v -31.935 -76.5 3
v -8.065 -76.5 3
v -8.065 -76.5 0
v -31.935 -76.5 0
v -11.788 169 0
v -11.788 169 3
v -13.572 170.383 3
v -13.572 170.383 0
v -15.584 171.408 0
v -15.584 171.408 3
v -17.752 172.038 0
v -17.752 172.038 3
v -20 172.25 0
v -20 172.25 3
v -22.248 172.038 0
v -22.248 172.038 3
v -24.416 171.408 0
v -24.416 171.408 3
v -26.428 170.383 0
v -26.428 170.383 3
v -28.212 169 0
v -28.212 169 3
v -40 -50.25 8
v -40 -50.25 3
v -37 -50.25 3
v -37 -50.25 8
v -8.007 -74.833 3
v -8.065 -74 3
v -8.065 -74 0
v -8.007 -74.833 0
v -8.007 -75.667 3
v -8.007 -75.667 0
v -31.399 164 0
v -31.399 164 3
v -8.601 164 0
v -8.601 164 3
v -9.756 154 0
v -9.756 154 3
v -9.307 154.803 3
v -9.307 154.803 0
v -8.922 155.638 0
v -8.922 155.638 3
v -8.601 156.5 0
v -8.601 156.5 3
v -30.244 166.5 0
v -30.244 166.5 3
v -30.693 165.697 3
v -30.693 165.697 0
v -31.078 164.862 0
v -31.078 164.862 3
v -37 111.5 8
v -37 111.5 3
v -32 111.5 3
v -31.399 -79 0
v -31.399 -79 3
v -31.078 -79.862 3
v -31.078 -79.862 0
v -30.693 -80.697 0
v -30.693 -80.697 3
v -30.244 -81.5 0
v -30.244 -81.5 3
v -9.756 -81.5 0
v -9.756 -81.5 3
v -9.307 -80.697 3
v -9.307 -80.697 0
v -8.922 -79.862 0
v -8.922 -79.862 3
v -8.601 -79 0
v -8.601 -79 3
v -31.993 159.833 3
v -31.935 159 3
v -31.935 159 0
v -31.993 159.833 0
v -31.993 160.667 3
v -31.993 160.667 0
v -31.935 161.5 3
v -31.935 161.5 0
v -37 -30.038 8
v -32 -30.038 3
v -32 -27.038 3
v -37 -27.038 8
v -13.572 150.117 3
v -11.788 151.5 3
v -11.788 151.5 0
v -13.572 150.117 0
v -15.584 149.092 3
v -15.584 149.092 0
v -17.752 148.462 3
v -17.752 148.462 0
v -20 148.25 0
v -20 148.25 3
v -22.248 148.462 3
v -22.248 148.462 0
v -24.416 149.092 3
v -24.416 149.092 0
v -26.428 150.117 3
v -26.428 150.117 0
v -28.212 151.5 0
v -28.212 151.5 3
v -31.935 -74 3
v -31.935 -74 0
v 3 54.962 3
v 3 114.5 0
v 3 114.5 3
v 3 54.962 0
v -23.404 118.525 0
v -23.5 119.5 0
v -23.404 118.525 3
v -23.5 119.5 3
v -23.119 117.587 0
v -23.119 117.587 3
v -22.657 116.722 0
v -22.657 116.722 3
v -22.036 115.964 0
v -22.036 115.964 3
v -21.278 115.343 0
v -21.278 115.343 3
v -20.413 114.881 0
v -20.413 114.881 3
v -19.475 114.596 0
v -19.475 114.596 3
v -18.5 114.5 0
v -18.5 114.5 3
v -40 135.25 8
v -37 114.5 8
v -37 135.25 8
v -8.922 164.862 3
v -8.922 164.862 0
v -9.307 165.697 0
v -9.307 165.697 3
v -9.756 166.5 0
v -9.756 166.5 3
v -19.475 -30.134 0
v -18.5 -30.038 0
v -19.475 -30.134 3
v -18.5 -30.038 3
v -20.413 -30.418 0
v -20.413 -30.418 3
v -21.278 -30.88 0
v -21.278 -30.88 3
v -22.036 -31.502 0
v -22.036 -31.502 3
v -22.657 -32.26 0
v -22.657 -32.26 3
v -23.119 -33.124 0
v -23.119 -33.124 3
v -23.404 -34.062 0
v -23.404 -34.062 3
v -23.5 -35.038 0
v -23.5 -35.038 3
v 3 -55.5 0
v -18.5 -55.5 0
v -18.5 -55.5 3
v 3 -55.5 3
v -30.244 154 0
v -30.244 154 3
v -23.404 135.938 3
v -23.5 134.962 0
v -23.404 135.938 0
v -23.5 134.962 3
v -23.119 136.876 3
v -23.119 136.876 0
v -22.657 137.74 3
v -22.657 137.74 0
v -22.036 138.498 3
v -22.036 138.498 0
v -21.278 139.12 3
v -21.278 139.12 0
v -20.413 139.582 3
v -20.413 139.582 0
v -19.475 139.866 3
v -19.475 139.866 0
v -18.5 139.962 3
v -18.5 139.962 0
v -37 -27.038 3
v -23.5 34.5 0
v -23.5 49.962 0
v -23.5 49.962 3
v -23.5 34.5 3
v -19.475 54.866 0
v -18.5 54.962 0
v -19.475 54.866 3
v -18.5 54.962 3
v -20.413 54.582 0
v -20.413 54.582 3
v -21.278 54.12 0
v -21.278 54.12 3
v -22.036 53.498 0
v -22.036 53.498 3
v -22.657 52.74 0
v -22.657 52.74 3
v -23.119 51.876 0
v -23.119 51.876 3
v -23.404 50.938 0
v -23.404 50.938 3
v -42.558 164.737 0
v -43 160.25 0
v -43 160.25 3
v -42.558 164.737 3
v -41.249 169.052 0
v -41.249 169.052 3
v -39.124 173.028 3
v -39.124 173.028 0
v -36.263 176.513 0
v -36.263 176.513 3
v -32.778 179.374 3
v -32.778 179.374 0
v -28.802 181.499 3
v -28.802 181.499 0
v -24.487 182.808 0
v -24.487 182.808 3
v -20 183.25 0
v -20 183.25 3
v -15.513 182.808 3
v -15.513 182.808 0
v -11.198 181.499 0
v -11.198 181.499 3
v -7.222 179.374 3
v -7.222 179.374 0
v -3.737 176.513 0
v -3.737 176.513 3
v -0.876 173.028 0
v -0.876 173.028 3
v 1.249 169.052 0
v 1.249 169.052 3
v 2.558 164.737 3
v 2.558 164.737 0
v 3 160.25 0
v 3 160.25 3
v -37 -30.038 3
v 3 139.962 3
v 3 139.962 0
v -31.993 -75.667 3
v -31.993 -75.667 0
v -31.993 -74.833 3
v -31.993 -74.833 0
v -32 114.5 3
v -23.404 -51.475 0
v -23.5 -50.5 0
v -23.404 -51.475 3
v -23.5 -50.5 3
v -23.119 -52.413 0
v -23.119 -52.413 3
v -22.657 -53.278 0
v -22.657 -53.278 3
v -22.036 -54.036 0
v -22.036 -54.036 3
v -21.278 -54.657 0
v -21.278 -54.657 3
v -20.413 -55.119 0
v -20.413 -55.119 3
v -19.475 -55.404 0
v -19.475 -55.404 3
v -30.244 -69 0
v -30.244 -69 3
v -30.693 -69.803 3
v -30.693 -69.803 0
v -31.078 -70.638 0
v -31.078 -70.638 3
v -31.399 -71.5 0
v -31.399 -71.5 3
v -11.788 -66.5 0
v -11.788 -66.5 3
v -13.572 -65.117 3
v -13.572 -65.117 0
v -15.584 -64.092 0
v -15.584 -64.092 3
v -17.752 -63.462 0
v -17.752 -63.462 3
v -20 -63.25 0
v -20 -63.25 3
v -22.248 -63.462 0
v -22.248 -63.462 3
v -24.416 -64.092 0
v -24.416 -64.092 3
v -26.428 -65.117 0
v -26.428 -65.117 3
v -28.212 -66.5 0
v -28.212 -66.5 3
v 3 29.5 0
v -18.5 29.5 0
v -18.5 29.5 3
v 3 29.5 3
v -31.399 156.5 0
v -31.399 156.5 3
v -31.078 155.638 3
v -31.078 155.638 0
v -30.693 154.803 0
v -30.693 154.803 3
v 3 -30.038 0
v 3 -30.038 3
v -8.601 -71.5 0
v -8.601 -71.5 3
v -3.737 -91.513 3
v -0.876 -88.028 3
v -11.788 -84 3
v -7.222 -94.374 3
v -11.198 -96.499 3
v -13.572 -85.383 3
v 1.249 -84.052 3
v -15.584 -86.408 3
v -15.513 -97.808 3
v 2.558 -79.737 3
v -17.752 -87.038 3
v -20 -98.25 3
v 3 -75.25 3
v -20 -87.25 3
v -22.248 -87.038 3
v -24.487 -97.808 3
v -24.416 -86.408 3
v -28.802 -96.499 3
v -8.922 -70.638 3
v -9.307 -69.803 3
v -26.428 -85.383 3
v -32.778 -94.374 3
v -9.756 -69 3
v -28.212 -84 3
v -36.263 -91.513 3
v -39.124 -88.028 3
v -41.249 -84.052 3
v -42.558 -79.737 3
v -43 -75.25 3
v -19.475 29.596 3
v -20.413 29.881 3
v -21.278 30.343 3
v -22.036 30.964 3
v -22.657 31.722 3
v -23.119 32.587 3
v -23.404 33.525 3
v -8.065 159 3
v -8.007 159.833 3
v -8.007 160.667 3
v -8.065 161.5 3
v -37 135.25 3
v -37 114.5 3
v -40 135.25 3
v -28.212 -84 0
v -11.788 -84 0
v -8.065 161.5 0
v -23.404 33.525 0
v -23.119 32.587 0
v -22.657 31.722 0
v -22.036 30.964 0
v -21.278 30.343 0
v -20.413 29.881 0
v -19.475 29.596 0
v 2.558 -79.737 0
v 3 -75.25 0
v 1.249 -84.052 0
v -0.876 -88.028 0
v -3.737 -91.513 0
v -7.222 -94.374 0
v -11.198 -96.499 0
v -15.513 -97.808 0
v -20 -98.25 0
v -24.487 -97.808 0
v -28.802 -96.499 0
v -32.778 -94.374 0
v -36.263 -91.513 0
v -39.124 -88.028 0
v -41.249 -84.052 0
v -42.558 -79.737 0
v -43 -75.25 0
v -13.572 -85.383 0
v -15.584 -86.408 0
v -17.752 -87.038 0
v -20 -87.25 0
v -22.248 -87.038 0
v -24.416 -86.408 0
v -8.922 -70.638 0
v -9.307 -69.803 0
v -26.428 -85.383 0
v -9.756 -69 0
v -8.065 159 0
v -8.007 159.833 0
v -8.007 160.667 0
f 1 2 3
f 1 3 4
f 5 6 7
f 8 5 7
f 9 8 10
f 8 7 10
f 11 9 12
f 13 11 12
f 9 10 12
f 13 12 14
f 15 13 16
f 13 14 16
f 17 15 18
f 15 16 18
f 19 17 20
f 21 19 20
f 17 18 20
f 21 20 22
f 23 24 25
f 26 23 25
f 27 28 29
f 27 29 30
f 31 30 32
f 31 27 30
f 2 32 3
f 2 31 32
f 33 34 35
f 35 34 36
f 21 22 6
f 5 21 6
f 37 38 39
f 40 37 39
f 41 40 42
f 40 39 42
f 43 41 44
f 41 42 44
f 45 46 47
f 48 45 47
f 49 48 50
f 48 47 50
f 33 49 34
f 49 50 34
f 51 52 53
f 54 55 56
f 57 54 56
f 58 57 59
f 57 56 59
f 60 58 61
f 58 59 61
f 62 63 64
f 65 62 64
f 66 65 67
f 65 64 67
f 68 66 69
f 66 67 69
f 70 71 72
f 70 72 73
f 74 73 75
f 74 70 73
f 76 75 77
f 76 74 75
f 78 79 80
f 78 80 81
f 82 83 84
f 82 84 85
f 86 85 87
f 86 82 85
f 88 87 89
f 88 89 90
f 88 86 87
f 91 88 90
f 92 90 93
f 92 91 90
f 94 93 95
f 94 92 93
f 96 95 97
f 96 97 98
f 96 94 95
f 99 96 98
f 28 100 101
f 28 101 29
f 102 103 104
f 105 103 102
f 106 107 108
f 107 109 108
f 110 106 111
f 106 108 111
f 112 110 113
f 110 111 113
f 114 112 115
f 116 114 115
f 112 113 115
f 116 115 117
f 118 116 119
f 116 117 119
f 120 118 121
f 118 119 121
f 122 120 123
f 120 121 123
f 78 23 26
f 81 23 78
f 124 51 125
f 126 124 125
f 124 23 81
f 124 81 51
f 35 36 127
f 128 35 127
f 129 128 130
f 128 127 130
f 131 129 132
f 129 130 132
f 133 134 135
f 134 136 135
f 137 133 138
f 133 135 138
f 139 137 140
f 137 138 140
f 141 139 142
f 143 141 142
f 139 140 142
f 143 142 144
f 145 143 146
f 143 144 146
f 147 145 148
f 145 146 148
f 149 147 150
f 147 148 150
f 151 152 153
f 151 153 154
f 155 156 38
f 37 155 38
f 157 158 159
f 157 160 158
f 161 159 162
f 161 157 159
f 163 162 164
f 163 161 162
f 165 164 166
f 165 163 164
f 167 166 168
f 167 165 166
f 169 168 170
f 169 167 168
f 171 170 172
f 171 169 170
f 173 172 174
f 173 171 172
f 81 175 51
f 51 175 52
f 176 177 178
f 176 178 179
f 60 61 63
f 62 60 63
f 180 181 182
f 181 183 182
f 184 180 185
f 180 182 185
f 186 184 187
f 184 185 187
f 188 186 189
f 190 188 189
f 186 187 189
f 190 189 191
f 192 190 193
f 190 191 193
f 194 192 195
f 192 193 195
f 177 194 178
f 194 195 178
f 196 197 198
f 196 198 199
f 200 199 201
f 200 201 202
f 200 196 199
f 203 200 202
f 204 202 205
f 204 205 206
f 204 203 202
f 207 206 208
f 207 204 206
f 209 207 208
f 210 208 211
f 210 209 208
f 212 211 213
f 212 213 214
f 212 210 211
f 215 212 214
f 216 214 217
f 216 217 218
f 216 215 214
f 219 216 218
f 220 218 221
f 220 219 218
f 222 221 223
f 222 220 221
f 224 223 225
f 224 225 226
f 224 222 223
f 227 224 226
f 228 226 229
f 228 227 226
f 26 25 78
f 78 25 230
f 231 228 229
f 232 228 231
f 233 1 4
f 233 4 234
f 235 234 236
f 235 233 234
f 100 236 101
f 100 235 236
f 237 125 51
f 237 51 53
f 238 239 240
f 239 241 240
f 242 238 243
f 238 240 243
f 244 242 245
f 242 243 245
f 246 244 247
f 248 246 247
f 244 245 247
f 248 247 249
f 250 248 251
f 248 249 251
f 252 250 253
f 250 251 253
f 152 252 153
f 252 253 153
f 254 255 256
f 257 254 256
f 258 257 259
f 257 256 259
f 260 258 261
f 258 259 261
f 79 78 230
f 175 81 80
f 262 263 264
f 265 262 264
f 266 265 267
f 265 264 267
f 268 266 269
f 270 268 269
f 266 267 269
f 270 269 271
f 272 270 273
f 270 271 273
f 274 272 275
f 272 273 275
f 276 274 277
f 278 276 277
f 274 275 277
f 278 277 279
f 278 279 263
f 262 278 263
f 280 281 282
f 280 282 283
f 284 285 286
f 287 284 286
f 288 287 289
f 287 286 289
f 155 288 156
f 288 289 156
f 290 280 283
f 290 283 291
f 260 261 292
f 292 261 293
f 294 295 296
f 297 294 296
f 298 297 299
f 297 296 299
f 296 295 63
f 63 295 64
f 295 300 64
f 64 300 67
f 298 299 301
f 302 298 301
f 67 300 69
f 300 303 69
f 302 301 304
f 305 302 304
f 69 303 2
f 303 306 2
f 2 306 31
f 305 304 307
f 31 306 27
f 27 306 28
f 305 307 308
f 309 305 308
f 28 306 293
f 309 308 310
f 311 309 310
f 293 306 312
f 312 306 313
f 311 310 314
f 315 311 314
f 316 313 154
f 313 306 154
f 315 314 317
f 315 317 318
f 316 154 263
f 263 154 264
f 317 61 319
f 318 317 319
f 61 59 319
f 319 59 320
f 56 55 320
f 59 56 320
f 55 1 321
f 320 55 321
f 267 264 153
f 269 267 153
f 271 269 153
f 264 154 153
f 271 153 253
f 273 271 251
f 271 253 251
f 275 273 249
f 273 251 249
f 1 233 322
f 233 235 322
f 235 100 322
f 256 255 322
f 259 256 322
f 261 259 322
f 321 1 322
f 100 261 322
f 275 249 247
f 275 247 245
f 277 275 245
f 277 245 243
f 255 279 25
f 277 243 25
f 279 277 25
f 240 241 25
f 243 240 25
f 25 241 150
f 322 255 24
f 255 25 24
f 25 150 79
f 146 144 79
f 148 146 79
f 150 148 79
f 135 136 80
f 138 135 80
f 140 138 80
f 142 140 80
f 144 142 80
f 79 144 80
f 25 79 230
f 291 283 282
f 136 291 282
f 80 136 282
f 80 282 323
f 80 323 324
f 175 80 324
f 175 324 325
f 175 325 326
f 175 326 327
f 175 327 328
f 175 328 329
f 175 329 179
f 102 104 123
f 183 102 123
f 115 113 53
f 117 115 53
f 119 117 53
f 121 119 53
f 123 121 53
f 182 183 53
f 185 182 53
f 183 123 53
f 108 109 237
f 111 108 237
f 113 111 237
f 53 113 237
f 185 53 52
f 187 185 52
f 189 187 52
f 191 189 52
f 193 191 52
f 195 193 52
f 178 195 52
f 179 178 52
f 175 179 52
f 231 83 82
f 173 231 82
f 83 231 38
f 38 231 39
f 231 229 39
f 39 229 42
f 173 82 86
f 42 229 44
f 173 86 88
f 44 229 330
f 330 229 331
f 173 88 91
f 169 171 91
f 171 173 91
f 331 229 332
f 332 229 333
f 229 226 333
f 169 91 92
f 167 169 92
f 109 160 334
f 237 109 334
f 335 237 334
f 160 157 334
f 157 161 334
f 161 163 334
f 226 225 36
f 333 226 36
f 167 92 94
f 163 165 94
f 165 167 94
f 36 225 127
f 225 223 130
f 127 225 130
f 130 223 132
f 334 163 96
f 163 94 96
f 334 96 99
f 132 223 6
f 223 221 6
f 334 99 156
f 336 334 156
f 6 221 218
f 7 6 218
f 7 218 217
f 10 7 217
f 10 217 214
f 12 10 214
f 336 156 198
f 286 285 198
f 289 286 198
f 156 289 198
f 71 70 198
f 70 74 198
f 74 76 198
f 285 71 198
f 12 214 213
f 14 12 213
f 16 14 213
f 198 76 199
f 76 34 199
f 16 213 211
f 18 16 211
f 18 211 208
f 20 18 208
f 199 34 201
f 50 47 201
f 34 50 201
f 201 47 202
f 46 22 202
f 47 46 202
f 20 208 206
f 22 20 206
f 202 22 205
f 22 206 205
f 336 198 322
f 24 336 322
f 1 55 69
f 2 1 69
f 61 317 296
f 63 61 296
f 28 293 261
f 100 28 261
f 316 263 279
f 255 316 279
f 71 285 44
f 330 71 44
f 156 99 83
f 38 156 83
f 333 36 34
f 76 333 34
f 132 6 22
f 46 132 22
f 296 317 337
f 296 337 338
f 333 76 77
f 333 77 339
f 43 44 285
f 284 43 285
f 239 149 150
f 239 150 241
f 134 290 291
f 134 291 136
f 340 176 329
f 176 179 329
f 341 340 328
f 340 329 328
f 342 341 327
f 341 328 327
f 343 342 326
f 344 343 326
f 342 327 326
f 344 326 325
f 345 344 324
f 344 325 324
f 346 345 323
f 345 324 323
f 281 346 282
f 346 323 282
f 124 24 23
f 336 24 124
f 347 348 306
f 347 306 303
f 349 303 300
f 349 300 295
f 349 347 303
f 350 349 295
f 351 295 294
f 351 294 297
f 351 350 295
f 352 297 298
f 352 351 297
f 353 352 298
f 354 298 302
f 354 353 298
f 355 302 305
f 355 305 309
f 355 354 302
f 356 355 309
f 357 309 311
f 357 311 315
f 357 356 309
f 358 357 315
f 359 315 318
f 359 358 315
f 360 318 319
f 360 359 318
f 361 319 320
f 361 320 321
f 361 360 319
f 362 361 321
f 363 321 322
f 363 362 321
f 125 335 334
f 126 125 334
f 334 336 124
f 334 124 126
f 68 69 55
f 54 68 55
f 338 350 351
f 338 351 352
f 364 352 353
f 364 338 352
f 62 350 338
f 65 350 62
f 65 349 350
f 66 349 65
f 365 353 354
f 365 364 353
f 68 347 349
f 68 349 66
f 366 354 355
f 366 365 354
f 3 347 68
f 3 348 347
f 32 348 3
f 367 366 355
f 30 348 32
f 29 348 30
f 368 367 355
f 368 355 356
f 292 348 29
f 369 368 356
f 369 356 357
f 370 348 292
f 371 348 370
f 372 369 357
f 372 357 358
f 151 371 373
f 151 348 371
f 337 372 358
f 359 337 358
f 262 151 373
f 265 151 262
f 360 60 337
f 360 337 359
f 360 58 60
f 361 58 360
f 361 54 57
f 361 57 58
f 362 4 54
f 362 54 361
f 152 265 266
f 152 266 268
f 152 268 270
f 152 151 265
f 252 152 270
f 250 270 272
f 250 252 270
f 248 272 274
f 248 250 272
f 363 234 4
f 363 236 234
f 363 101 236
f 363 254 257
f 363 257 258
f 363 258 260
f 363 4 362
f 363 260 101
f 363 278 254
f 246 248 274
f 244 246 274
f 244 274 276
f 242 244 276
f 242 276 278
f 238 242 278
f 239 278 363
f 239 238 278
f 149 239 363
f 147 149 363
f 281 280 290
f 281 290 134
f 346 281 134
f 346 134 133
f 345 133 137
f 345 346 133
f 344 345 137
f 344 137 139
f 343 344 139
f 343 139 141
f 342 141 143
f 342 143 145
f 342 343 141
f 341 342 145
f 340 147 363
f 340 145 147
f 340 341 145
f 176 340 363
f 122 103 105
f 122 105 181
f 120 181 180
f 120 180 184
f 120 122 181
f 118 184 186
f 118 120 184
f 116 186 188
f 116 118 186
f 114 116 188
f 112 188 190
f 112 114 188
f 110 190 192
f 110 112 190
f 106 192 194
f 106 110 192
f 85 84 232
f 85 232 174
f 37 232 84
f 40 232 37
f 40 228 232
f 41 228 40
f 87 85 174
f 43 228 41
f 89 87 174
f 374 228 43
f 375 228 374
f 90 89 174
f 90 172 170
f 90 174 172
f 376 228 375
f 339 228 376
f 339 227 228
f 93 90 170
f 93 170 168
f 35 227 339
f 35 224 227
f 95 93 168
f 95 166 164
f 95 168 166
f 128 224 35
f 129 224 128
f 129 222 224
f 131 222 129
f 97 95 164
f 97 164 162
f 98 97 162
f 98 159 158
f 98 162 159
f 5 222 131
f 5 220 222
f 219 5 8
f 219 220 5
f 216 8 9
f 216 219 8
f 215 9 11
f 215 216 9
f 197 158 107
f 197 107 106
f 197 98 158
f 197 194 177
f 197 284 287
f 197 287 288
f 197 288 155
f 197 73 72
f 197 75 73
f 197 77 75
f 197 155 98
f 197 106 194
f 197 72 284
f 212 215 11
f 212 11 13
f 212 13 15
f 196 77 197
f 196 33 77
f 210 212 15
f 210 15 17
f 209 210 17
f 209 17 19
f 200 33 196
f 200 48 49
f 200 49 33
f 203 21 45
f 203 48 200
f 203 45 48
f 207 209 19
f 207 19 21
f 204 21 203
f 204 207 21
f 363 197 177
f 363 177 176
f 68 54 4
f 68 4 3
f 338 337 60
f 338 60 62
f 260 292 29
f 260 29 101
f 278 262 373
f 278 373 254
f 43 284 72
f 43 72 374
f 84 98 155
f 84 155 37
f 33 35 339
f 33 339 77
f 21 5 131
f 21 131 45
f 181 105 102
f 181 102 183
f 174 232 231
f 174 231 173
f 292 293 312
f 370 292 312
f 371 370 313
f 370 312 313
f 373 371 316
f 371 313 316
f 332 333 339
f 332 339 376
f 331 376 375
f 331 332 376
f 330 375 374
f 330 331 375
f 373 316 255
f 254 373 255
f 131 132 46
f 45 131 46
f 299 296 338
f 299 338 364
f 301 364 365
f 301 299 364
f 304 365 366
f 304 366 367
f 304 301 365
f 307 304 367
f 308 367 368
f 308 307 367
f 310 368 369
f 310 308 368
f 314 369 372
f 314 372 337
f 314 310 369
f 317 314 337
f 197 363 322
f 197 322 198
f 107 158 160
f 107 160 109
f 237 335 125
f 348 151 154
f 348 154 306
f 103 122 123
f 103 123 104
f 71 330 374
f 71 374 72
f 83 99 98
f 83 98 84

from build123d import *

# Parameters (mm, degrees)
BOSS_EXTRUDE1_DEPTH = 3
FILLET1_R           = 5
CUT_EXTRUDE1_DEPTH  = 3
SKETCH3_W           = 3
SKETCH3_H           = 185.5
BOSS_EXTRUDE2_DEPTH = 5
BOSS_EXTRUDE3_DEPTH = 3
BOSS_EXTRUDE4_DEPTH = 3


with BuildPart() as part:
    # Sketch1 → Boss-Extrude1 (new body)
    with BuildSketch(Plane.XY):
        with BuildLine():
            Line((-23.5, 139.962429423), (-23.5, 114.5))
            Line((-23.5, 114.5), (3, 114.5))
            Line((3, 114.5), (3, 54.962429423))
            Line((3, 54.962429423), (-23.5, 54.962429423))
            Line((-23.5, 54.962429423), (-23.5, 29.5))
            Line((-23.5, 29.5), (3, 29.5))
            Line((3, 29.5), (3, -30.037570577))
            Line((3, -30.037570577), (-23.5, -30.037570577))
            Line((-23.5, -30.037570577), (-23.5, -55.5))
            Line((-23.5, -55.5), (3, -55.5))
            Line((3, -55.5), (3, -75.25))
            ThreePointArc((3, -75.25), (-20, -98.25), (-43, -75.25))
            Line((-43, -75.25), (-43, 160.25))
            ThreePointArc((-43, 160.25), (-20, 183.25), (3, 160.25))
            Line((3, 160.25), (3, 139.962429423))
            Line((3, 139.962429423), (-23.5, 139.962429423))
        make_face()
    extrude(amount=BOSS_EXTRUDE1_DEPTH)

    # Fillet1
    fillet1_edges = [part.edges().sort_by_distance(p)[0] for p in [
        (-23.5, 139.962429423, 1.5),
        (-23.5, 114.5, 1.5),
        (-23.5, 54.962429423, 1.5),
        (-23.5, 29.5, 1.5),
        (-23.5, -30.037570577, 1.5),
        (-23.5, -55.5, 1.5),
    ]]
    fillet(fillet1_edges, radius=FILLET1_R)

    # Sketch2 → Cut-Extrude1 (cut)
    with BuildSketch(Plane.XY.offset(3)):
        with BuildLine():
            Line((-31.934718262, 161.5), (-8.065281738, 161.5))
            ThreePointArc((-8.065281738, 161.5), (-8, 160.25), (-8.065281738, 159))
            Line((-8.065281738, 159), (-31.934718262, 159))
            ThreePointArc((-31.934718262, 159), (-32, 160.25), (-31.934718262, 161.5))
        make_face()
        with BuildLine():
            Line((-31.399013115, 164), (-8.600986885, 164))
            ThreePointArc((-8.600986885, 164), (-9.106587826, 165.283246588), (-9.756099376, 166.5))
            Line((-9.756099376, 166.5), (-30.243900624, 166.5))
            ThreePointArc((-30.243900624, 166.5), (-30.893412174, 165.283246588), (-31.399013115, 164))
        make_face()
        with BuildLine():
            Line((-28.212033853, 169), (-11.787966147, 169))
            ThreePointArc((-11.787966147, 169), (-20, 172.25), (-28.212033853, 169))
        make_face()
        with BuildLine():
            Line((-28.212033853, 151.5), (-11.787966147, 151.5))
            ThreePointArc((-11.787966147, 151.5), (-20, 148.25), (-28.212033853, 151.5))
        make_face()
        with BuildLine():
            Line((-30.243900624, 154), (-9.756099376, 154))
            ThreePointArc((-9.756099376, 154), (-9.106587826, 155.216753412), (-8.600986885, 156.5))
            Line((-8.600986885, 156.5), (-31.399013115, 156.5))
            ThreePointArc((-31.399013115, 156.5), (-30.893412174, 155.216753412), (-30.243900624, 154))
        make_face()
        with BuildLine():
            Line((-31.399013115, -71.5), (-8.600986885, -71.5))
            ThreePointArc((-8.600986885, -71.5), (-9.106587826, -70.216753412), (-9.756099376, -69))
            Line((-9.756099376, -69), (-30.243900624, -69))
            ThreePointArc((-30.243900624, -69), (-30.893412174, -70.216753412), (-31.399013115, -71.5))
        make_face()
        with BuildLine():
            Line((-28.212033853, -66.5), (-11.787966147, -66.5))
            ThreePointArc((-11.787966147, -66.5), (-20, -63.25), (-28.212033853, -66.5))
        make_face()
        with BuildLine():
            Line((-31.934718262, -74), (-8.065281738, -74))
            ThreePointArc((-8.065281738, -74), (-8, -75.25), (-8.065281738, -76.5))
            Line((-8.065281738, -76.5), (-31.934718262, -76.5))
            ThreePointArc((-31.934718262, -76.5), (-32, -75.25), (-31.934718262, -74))
        make_face()
        with BuildLine():
            Line((-28.212033853, -84), (-11.787966147, -84))
            ThreePointArc((-11.787966147, -84), (-20, -87.25), (-28.212033853, -84))
        make_face()
        with BuildLine():
            Line((-30.243900624, -81.5), (-9.756099376, -81.5))
            ThreePointArc((-9.756099376, -81.5), (-9.106587826, -80.283246588), (-8.600986885, -79))
            Line((-8.600986885, -79), (-31.399013115, -79))
            ThreePointArc((-31.399013115, -79), (-30.893412174, -80.283246588), (-30.243900624, -81.5))
        make_face()
    extrude(amount=-CUT_EXTRUDE1_DEPTH, mode=Mode.SUBTRACT)

    # Sketch3 → Boss-Extrude2 (add)
    with BuildSketch(Plane.XY.offset(3)):
        with Locations((-38.5, 42.5)):
            Rectangle(SKETCH3_W, SKETCH3_H)
    extrude(amount=BOSS_EXTRUDE2_DEPTH)

    # Sketch4 → Boss-Extrude3 (add)
    with BuildSketch(Plane.XZ.offset(30.037570577)):
        Polygon((-37, 8), (-37, 3), (-32, 3), align=None)
    extrude(amount=-BOSS_EXTRUDE3_DEPTH)

    # Sketch5 → Boss-Extrude4 (add)
    with BuildSketch(Plane(origin=(0, 114.5, 0), x_dir=(1, 0, 0), z_dir=(0, 1, 0))):
        Polygon((-37, -8), (-32, -3), (-37, -3), align=None)
    extrude(amount=-BOSS_EXTRUDE4_DEPTH)


solid = part.part
